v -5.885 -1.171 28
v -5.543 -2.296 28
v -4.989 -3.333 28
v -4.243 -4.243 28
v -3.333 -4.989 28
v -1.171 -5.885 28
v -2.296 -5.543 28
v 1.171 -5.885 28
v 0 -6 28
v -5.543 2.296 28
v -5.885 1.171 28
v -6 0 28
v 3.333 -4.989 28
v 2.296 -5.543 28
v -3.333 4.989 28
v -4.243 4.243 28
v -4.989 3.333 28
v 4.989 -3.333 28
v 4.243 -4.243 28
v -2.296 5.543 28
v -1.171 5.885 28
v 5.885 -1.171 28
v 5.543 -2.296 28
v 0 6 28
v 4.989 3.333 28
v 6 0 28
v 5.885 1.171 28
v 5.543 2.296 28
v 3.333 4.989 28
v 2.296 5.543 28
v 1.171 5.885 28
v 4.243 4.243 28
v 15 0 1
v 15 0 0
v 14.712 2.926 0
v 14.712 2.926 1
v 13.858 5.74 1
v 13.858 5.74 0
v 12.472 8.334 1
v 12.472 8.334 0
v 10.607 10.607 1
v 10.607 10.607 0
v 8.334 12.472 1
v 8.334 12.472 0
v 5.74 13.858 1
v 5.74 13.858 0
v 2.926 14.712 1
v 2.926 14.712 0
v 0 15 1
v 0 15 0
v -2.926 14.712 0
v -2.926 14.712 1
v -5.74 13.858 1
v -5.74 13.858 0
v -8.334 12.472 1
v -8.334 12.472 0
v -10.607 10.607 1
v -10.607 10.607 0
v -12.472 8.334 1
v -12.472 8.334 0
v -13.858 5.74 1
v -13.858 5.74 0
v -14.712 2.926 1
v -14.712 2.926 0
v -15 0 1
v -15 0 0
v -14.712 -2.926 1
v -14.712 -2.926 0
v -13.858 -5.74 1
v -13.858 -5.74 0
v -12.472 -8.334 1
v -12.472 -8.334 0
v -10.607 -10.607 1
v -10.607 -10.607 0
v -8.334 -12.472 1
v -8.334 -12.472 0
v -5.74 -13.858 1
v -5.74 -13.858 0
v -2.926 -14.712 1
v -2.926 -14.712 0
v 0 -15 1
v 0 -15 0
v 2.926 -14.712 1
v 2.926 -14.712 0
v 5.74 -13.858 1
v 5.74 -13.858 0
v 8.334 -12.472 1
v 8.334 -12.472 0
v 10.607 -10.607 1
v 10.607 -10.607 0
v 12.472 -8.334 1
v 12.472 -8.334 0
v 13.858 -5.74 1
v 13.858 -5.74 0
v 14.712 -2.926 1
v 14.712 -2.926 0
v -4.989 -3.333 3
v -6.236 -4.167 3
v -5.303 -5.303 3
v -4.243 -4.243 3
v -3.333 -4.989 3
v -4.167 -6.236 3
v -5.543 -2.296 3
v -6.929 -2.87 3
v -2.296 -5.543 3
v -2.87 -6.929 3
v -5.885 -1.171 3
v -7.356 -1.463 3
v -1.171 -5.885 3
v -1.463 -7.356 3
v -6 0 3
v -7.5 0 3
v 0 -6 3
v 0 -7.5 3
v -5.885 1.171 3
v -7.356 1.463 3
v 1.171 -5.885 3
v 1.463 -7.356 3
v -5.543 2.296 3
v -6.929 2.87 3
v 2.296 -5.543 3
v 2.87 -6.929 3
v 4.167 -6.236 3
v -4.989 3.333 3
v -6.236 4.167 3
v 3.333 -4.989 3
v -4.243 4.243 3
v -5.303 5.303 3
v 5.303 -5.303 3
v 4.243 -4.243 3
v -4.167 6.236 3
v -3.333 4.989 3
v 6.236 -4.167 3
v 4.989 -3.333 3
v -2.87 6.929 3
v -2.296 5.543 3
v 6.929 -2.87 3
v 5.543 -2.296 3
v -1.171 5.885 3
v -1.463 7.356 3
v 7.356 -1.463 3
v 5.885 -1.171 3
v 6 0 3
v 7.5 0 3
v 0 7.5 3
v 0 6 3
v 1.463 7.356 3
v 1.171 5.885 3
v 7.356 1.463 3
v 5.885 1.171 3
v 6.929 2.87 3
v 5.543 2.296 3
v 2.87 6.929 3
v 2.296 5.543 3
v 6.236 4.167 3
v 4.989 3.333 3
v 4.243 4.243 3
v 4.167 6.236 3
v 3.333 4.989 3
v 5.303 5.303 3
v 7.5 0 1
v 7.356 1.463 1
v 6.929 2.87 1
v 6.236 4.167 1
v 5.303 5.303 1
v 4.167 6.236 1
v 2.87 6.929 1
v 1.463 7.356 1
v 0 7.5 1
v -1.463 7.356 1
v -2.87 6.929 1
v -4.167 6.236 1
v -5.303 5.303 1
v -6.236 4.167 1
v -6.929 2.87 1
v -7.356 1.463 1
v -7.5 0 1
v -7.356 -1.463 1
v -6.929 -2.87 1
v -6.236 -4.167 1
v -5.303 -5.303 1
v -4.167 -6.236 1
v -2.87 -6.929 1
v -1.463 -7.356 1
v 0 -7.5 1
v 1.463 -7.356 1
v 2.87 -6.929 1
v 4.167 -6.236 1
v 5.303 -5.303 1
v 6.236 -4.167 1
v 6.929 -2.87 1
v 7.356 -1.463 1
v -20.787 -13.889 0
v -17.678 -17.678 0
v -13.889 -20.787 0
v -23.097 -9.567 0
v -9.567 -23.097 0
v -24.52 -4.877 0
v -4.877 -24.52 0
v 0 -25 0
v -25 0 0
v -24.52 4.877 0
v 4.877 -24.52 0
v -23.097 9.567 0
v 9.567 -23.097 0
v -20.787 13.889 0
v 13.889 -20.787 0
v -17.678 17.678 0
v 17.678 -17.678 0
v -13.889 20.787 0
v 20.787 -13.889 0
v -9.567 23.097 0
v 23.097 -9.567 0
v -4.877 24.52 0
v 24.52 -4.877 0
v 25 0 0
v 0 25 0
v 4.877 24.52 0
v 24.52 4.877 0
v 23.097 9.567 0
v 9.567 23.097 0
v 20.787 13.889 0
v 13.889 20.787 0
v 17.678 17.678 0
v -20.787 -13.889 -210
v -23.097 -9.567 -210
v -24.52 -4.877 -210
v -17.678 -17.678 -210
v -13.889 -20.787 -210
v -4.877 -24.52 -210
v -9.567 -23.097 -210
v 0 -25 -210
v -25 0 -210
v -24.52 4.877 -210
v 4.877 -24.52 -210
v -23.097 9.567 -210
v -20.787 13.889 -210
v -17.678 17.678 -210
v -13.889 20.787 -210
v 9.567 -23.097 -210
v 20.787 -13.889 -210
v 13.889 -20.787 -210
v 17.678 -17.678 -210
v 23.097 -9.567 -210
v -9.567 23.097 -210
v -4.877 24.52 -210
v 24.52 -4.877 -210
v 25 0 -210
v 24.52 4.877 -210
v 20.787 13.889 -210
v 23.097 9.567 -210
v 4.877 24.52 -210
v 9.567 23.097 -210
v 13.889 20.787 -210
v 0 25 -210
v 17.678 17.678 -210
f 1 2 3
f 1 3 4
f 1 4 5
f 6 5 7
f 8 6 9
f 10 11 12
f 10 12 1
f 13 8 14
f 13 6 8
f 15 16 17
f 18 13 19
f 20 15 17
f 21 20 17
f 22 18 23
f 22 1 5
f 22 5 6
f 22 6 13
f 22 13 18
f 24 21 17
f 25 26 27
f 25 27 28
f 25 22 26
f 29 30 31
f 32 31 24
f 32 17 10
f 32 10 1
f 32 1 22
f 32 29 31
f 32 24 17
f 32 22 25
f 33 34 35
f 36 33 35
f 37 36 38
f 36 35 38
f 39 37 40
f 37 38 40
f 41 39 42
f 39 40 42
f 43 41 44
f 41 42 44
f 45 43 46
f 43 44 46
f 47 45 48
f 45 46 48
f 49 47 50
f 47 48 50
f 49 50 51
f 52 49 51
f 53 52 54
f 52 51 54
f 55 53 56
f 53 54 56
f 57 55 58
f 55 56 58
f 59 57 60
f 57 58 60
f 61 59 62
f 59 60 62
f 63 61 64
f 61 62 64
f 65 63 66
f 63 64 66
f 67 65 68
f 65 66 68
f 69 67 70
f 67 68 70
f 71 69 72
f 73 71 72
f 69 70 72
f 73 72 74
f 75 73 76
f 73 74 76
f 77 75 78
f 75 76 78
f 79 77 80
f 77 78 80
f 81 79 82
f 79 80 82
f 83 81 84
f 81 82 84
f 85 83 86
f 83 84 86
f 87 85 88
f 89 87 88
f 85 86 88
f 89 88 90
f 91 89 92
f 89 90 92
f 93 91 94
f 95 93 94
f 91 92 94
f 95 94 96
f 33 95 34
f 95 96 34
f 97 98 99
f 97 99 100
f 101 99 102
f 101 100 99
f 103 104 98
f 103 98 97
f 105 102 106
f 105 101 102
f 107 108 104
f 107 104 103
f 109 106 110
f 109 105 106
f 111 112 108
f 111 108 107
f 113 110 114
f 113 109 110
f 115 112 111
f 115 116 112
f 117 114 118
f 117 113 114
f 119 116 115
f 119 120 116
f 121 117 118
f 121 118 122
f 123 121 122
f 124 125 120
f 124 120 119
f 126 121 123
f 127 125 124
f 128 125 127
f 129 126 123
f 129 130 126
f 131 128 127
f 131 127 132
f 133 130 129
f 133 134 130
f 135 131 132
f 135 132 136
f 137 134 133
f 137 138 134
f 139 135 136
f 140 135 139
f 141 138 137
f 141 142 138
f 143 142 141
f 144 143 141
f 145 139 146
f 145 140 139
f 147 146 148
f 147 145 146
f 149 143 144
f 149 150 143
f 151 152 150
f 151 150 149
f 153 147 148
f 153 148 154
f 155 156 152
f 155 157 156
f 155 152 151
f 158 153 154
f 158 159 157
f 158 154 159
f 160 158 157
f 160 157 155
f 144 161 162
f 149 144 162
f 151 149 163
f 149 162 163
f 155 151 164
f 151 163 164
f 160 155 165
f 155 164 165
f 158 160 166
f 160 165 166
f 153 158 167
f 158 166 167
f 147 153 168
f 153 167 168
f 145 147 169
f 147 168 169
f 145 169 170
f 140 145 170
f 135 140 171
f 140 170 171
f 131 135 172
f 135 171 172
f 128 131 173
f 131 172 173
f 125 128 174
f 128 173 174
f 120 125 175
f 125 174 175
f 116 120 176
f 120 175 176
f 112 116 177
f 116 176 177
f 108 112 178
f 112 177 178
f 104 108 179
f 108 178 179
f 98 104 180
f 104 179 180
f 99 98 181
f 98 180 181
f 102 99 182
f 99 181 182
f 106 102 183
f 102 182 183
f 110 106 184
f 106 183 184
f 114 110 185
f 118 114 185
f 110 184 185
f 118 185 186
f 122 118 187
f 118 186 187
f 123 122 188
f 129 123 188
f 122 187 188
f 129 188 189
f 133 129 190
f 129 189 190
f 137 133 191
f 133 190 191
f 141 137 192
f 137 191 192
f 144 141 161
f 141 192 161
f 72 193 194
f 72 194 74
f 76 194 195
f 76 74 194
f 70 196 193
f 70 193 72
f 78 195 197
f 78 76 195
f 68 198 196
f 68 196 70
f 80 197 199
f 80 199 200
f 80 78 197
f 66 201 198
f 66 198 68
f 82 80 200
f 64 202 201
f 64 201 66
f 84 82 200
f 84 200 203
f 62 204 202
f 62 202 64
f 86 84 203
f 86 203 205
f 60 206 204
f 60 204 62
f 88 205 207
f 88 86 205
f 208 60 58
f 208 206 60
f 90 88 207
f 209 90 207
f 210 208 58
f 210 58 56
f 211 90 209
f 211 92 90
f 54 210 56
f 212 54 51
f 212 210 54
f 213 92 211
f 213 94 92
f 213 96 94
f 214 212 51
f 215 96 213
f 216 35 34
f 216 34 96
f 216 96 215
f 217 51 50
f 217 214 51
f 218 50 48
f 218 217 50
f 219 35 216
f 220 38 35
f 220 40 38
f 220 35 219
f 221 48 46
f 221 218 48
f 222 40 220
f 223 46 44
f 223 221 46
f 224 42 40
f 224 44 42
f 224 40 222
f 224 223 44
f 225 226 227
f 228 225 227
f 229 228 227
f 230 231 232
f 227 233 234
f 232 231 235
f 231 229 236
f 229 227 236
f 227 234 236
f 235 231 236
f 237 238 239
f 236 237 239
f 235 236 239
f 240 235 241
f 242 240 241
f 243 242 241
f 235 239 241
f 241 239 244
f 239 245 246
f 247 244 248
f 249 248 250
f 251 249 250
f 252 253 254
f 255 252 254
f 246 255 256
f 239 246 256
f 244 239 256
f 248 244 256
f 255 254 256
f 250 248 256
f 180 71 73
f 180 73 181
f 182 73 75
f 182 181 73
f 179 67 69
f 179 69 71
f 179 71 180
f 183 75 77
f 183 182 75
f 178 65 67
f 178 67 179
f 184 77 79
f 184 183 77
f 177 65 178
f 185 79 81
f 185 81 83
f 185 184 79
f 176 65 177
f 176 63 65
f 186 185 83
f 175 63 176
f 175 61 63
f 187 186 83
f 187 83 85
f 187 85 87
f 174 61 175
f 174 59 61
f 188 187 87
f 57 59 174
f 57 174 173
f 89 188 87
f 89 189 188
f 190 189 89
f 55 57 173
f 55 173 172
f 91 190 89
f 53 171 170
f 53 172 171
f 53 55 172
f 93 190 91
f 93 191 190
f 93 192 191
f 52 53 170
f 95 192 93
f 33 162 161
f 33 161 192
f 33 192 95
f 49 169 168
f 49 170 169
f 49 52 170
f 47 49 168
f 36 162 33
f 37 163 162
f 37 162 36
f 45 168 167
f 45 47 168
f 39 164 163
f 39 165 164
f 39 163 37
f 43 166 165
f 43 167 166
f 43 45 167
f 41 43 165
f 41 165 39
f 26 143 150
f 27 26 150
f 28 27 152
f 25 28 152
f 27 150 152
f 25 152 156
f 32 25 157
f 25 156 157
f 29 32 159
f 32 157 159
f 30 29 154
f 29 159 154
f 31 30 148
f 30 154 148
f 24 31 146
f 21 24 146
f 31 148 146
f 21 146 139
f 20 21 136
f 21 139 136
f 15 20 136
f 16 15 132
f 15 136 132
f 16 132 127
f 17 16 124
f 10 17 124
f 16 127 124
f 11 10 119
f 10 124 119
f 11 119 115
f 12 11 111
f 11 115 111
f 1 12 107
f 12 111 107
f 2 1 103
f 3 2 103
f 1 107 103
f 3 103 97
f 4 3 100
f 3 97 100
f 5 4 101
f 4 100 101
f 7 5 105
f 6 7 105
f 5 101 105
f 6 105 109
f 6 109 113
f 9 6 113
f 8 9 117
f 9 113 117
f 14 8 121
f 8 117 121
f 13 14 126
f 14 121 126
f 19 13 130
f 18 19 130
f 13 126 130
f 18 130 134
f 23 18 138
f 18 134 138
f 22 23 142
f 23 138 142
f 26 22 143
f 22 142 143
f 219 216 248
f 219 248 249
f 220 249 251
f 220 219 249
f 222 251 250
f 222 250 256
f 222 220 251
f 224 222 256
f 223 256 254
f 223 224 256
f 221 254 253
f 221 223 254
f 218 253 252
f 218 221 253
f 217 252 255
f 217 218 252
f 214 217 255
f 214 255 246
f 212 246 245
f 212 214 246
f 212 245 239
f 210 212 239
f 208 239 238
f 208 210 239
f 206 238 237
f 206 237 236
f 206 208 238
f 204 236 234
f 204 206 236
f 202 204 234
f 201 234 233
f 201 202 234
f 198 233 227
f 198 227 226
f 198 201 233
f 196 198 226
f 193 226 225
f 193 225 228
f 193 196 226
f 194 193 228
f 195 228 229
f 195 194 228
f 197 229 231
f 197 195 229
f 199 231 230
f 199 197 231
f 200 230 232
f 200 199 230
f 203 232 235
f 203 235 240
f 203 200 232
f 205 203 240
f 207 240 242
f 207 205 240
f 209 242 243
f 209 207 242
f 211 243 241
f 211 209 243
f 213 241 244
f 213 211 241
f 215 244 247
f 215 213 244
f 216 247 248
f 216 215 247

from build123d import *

# Parameters (mm, degrees)
SKETCH1_R           = 25
BOSS_EXTRUDE2_DEPTH = 210
SKETCH2_R           = 15
BOSS_EXTRUDE3_DEPTH = 1
SKETCH3_R           = 7.5
BOSS_EXTRUDE4_DEPTH = 2
SKETCH4_R           = 6
BOSS_EXTRUDE5_DEPTH = 25


with BuildPart() as part:
    # Sketch1 → Boss-Extrude2 (new body)
    with BuildSketch(Plane.XY):
        Circle(SKETCH1_R)
    extrude(amount=-BOSS_EXTRUDE2_DEPTH)

    # Sketch2 → Boss-Extrude3 (add)
    with BuildSketch(Plane.XY):
        Circle(SKETCH2_R)
    extrude(amount=BOSS_EXTRUDE3_DEPTH)

    # Sketch3 → Boss-Extrude4 (add)
    with BuildSketch(Plane.XY.offset(1)):
        Circle(SKETCH3_R)
    extrude(amount=BOSS_EXTRUDE4_DEPTH)

    # Sketch4 → Boss-Extrude5 (add)
    with BuildSketch(Plane.XY.offset(3)):
        Circle(SKETCH4_R)
    extrude(amount=BOSS_EXTRUDE5_DEPTH)


solid = part.part
